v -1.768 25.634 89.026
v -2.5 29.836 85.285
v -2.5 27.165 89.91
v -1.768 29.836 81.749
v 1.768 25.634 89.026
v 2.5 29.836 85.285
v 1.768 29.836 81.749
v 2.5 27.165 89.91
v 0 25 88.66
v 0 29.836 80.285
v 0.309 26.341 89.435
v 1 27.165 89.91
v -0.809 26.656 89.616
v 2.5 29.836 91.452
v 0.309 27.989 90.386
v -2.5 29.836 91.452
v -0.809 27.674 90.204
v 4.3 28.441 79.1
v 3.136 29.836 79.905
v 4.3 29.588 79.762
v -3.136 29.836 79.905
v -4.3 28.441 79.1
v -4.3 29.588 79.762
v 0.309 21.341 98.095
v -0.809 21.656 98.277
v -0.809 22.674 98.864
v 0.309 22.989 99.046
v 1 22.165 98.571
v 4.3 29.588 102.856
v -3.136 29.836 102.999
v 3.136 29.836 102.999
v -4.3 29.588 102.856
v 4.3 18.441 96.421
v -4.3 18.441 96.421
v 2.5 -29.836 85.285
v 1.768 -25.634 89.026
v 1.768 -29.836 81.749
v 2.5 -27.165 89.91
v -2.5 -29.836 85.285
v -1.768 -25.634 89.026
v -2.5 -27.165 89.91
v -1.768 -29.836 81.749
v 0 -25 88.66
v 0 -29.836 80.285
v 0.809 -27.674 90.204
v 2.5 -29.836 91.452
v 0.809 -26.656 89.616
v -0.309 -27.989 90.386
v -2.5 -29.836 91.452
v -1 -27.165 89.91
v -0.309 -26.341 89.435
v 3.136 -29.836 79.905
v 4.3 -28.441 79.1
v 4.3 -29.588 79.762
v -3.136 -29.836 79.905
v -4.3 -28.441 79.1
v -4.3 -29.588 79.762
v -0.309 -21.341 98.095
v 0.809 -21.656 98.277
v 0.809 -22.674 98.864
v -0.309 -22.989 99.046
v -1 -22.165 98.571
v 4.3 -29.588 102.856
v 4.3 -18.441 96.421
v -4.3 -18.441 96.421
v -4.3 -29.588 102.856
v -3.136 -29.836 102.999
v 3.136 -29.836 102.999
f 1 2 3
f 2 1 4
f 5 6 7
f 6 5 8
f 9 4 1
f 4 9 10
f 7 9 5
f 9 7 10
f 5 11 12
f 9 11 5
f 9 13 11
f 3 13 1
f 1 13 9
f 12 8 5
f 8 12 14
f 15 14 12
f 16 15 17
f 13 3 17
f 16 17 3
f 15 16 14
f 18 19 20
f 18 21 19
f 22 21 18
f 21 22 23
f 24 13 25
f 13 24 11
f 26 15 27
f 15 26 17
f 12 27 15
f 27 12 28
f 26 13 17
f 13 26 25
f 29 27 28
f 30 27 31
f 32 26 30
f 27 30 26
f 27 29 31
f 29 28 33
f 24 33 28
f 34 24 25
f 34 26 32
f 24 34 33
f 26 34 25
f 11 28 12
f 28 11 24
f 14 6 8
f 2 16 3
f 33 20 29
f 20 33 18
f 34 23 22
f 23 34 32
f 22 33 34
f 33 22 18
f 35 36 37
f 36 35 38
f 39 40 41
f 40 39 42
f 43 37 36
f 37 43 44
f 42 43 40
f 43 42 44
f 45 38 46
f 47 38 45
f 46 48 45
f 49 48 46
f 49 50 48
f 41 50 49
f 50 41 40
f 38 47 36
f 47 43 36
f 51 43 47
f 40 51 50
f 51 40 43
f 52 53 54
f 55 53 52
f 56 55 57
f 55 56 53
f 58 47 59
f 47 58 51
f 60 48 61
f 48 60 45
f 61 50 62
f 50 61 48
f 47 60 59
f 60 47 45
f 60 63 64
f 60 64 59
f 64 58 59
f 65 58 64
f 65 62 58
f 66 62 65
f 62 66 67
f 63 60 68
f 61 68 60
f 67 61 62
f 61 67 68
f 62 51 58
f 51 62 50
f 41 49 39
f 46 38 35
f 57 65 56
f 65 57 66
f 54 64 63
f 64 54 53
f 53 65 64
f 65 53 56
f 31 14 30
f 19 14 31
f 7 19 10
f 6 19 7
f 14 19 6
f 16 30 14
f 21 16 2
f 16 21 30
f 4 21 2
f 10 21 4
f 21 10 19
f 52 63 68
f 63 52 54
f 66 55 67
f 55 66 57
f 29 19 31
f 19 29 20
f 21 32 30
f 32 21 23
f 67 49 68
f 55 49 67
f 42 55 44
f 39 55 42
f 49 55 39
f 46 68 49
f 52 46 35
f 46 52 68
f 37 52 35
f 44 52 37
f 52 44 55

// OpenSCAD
// file: library.scad
module frustum(width, depth, width2, depth2, height) {
    // polyhedron(points = [ [x, y, z], ... ], faces = [ [p1, p2, p3..], ... ], convexity = N);

    polyhedron(
        points = [
            [-width / 2, -depth / 2, 0],
            [width / 2, -depth / 2, 0],
            [width / 2, depth / 2, 0],
            [-width / 2, depth / 2, 0],
            
            [-width2 / 2, -depth2 / 2, height],
            [-width2 / 2, depth2 / 2, height],
            [width2 / 2, depth2 / 2, height],
            [width2 / 2, -depth2 / 2, height]
        ],
        faces = [
            // bottom
            [0, 1, 2, 3],
            // top
            [4, 5, 6, 7],
    
            // front
            [4, 7, 1, 0],
            // back
            [6, 5, 3, 2],
            // left
            [5, 4, 0, 3],
            // right
            [7, 6, 2, 1]
        ]
    );
}


module pyramid(width, depth, height, center = false) {
    if (center) {
    } else {
    }
    
    polyhedron(
        points = [
            [-width / 2, -depth / 2, 0],
            [width / 2, -depth / 2, 0],
            [width / 2, depth / 2, 0],
            [-width / 2, depth / 2, 0],
            
            [0, 0, height]
        ],
        faces = [
            [0, 1, 2, 3],
            
            [0, 4, 1],
            [2, 4, 3],
            [3, 4, 0],
            [1, 4, 2]
        ]
    );
}


module ccube(width, depth, height, center_z = false, corner_cut = 0) {
	if (center_z) {
		translate([-width / 2, -depth / 2, -height / 2]) {
			difference () {
				cube([width, depth, height]);
			}
			
			children();
		}
	} else {
		translate([-width / 2, -depth / 2, 0]) {
			difference () {
				cube([width, depth, height]);
				
				if (corner_cut > 0) {
					//translate([width / 2, height / 2, 0])
					rotate([0, 0, 45])
					ccube(corner_cut, corner_cut, height);

					translate([width, 0, 0])
					rotate([0, 0, 45])
					ccube(corner_cut, corner_cut, height);
					
					translate([width, depth, 0])
					rotate([0, 0, 45])
					ccube(corner_cut, corner_cut, height);

					translate([0, depth, 0])
					rotate([0, 0, 45])
					ccube(corner_cut, corner_cut, height);
				}
			}
			
			children();
		}
	}
}


module ring(radius, width, height) {
	difference () {
		cylinder(r = radius, h = height);
		cylinder(r = radius - width, h = height);
	}
}


module hexagon(side, height) {
	h = sqrt(3) * side;
	
	for (i = [0 : 5]) {
		rotate([0, 0, i * 60])
		translate([-side / 2, -h / 2, 0])
		cube([side, h, height]);
	}
}


module ramp(width, depth, height) {
    angle = atan(height / depth);
    
    difference () {
        cube([width, depth, height]);
    
        //color("red")
        rotate([angle, 0, 0])
        translate([-1, 0, 0])
        cube([width + 2, depth * 2, height]);
    }
}


module round_inner_corner(width, depth) {
	difference() {
		cube([width, depth, width]);
		
		translate([width, 3 * depth / 2, width])
		rotate([90, 0, 0])
		cylinder(r = width, h = depth * 2);
	}
}


module slide_clip(width,
                  depth,
                  height,
                  wall,
                  inner = false,
                  slack = 0) {
    difference () {
        union () {
            if (inner) {
                translate([-wall / 2, 0, 0])
                cube([wall, depth, height - wall]);
                
                translate([-width / 2, depth - wall, 0])
                cube([width, wall, height - wall]);
                
                //translate([-width / 2, 0, height - wall])
                //cube([width, depth, wall]);
            } else {    
                translate([-wall / 2, 0, 0])
                cube([wall, depth, height]);
                
                translate([-width / 2, depth - wall, 0])
                cube([width, wall, height]);
                
                translate([-width / 2, 0, height - wall])
                cube([width, depth, wall]);
            }
        }
        
        if (!inner) {
            translate([wall / 2, depth - wall, 0])
            rotate([0, 30, 0])
            cube([width, wall, height]);
            
            translate([-wall / 2, depth - wall, 0])
            rotate([0, -30, 0])
            translate([-width, 0, 0])
            cube([width, wall, height]);
            
            translate([0, depth - wall / 2, 0])
            rotate([-30, 0, 0])
            translate([-width / 2, 0, 0])
            cube([width, wall, height]);
        }
    }
}


/*
slide_clip(6, 6, 50, 2);

translate([20, 0, 0])
slide_clip(6, 6, 50, 2, true, slack = 0.5);
*/


// ramp(100, 50, 20);
// main file
use <library.scad>

radius = 30;
inner_radius = 20;

wall = 0.6;
height = 100;
motor_top = 80;
motor_bottom = 20;

rib_count = 12;

fin_r = 50;
fin_h = 5;
fin_spacing = 5;

screw_outer_r = 2.5;
screw_inner_r = 1;
screw_length = 10;


module twisted_ribs(outer_r, inner_r, height, twist, count, wall) {
	angle = 360 / count;
	linear_extrude(height, twist = twist, slices = 20) {
		for (i = [0 : (count - 1)]) {
			rotate([0, 0, i * angle])
			translate([0, inner_r])
			square([wall, outer_r - inner_r]);
		}
	}
}


module motor_holder() {
	intersection () {
		for (i = [0 : 1]) {
			rotate([0, 0, i * 180])
			translate([inner_radius * 0.2, -radius, 0])
			cube([radius - inner_radius * 0.2, radius * 2, wall * 4]);

			//rotate([0, 0, 90 + i * 180])
			//translate([inner_radius / 2, -radius, wall * 4])
			//cube([wall * 4, radius * 2, wall * 4]);
		}
	
		cylinder(r = radius, h = height); 
	}
}


module circular_grid_fin(outer_r, inner_r, wall, spacing, height) {
	ring(outer_r, wall, height);
	
	c = (outer_r * 2) / spacing;
	
	difference () {
	intersection () {
		union () {
			for (i = [1 : (c - 1)]) {
				translate([-outer_r + i * spacing - wall / 2, -outer_r, 0])
				cube([wall, outer_r * 2, height]);

				translate([-outer_r, -outer_r + i * spacing - wall / 2, 0])
				cube([outer_r * 2, wall, height]);
			}
		}
		
		cylinder(r = outer_r, h = height);
	}
	cylinder(r = inner_r, h = height);
	}
}


module hull(radius, inner_radius, height, wall, motor_bottom) {
	difference () {
		cylinder(r = radius, h = height);
		cylinder(r = radius - wall, h = height);
	}


	difference () {
		union () {
			twisted_ribs(
				radius,
				inner_radius,
				height,
				60,
				rib_count,
				wall
			);
			/*
			twisted_ribs(
				radius,
				inner_radius,
				height,
				-10,
				rib_count,
				wall
			);
			*/
		};
	
		cylinder(
			r1 = radius - wall,
			r2 = inner_radius,
			h = motor_bottom
		);
	}
}


module screw_anchor(outer_r, inner_r, depth, height, wall) {
	rotate([30, 0, 0])
	difference () {
		//translate([-outer_r / 2 - wall, outer_r / 2, 0])
		translate([-outer_r - wall, -wall, 0])
		cube([(outer_r + wall) * 2, depth, height]);

		//ccube(outer_r + wall * 2, outer_r + wall * 2, height);
		translate([0, outer_r, 0]) {
		cylinder(r = outer_r, h = height / 2);
		cylinder(r = inner_r, h = height);
		
		translate([-outer_r, 0, 0])
		cube([outer_r * 2, depth, height / 2]);
		}
	}
}


translate([0, 0, height - 20])
intersection () {
	for (i = [0 : 1]) {
		rotate([0, 0, i * 180])
		translate([0, radius, 0])
		screw_anchor(screw_outer_r, screw_inner_r, radius, screw_length * 2, wall * 3);
	}
	translate([0, 0, -height / 2])
	cylinder(r = radius, h = height);
}

// circular_grid_fin(fin_r, radius - wall, wall, fin_spacing, fin_h);


/*
difference () {
	union () {
		hull(radius, inner_radius, height, wall, motor_bottom);

		translate([0, 0, motor_top])
		motor_holder();
	}

	translate([0, 0, height - 20])
	for (i = [0 : 1]) {
		rotate([0, 0, i * 180])
		translate([0, radius, 0])
		translate([0, outer_r, 0])
		cylinder(r = screw_outer_r, h = screw_length);
	}
}
*/
